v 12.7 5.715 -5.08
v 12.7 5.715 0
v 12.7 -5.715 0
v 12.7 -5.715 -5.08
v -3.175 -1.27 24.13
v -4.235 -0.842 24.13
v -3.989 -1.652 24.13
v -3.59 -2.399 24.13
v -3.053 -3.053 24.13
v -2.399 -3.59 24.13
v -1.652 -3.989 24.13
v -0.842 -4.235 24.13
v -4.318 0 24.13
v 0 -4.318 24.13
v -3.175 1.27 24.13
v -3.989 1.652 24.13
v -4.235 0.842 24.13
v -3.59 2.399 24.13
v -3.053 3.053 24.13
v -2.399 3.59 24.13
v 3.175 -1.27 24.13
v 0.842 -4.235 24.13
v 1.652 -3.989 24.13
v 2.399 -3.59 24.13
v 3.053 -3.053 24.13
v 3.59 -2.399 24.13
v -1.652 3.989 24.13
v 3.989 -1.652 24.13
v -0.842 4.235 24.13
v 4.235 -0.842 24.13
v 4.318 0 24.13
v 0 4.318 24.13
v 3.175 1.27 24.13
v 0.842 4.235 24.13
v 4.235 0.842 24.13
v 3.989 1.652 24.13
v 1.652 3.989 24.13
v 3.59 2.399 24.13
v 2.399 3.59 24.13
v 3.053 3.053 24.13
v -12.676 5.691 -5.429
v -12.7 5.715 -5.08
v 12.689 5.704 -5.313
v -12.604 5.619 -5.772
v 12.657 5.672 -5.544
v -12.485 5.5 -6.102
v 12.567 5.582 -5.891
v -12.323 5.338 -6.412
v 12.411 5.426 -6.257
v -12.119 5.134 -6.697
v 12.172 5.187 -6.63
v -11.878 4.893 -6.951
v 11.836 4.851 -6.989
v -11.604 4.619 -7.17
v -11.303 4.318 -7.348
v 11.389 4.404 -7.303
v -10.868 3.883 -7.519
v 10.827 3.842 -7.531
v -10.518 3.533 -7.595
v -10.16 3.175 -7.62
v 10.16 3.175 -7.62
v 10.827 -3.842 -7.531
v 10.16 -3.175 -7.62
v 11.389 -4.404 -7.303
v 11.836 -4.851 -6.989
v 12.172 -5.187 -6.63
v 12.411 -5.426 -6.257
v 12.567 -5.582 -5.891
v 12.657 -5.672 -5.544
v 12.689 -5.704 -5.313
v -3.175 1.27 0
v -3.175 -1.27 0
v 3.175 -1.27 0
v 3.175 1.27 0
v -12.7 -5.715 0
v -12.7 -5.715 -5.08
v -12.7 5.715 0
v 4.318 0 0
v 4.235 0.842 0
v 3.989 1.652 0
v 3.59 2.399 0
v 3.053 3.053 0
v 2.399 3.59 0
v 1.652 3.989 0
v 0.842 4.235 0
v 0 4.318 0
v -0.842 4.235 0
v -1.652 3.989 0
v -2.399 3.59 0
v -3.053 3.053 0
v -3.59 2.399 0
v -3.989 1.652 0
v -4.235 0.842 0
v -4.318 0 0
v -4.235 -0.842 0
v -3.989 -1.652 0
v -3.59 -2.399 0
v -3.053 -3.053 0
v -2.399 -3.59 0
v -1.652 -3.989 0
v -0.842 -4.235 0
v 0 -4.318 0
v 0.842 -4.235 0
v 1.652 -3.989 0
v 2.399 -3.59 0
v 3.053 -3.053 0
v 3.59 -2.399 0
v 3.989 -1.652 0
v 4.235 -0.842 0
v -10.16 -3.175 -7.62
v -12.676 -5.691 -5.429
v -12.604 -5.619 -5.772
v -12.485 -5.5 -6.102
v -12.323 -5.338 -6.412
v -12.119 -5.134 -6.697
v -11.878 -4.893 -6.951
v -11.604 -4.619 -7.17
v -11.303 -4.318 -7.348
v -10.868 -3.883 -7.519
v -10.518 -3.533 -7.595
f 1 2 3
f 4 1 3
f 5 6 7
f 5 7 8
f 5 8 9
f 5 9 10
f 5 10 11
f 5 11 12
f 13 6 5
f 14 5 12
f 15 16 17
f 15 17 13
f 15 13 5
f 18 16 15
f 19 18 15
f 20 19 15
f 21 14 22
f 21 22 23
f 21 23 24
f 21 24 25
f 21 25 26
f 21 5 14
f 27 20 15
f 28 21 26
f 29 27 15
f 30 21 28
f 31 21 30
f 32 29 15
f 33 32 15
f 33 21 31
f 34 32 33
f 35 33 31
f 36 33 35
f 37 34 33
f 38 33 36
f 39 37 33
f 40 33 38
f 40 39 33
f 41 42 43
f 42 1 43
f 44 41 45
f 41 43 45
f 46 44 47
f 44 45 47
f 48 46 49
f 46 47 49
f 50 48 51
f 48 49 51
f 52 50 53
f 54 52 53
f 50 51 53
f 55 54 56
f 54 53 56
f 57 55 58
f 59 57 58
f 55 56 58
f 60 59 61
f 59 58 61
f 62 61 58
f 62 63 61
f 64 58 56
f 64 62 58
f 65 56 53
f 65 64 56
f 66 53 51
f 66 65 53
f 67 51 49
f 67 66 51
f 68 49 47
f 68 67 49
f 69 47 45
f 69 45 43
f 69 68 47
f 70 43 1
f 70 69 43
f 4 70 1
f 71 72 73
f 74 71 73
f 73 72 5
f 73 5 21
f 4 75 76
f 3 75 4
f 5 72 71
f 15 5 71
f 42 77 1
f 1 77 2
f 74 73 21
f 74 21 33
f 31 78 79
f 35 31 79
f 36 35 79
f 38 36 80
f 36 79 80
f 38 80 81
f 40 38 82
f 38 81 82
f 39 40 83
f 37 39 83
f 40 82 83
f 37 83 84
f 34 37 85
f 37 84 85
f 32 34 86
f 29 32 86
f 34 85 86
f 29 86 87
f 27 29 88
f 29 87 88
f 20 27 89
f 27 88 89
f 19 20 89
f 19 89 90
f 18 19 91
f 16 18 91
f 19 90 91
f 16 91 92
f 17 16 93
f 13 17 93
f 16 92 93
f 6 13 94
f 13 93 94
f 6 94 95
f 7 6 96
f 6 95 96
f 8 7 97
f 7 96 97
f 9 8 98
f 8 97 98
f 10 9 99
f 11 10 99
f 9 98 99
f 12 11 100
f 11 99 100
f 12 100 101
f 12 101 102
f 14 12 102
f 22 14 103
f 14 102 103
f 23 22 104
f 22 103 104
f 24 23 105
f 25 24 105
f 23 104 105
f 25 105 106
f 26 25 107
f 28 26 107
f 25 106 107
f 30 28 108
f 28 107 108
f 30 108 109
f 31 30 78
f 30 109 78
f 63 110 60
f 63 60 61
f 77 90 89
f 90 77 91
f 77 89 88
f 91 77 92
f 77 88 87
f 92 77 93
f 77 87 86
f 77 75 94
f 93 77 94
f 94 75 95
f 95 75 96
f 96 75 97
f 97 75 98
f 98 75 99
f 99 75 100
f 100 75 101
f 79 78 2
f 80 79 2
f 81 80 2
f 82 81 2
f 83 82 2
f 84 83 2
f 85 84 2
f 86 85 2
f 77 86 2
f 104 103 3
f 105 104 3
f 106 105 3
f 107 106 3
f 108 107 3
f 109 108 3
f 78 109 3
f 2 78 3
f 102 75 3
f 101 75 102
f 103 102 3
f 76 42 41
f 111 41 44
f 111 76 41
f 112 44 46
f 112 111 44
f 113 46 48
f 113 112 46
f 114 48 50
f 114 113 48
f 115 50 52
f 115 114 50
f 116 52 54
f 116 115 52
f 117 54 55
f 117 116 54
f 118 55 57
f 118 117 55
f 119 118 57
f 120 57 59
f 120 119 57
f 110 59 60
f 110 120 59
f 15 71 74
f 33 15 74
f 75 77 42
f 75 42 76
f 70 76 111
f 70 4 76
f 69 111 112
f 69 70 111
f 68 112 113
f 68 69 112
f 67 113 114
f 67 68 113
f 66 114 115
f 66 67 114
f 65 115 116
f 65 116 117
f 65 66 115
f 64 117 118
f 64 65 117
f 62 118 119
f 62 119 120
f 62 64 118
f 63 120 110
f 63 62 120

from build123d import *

# Parameters (mm, degrees)
F0_R     = 4.318
F0_W     = 6.35
F0_H     = 2.54
F1_DEPTH = 24.13
F2_W     = 25.4
F2_H     = 11.43
F2_R     = 4.318
F2_W_2   = 6.35
F2_H_2   = 2.54
F3_DEPTH = 7.62
F4_R     = 2.54


with BuildPart() as f1:
    # F0 (on Top) → F1 (new body)
    with BuildSketch(Plane.XY):
        Circle(F0_R)
        Rectangle(F0_W, F0_H, mode=Mode.SUBTRACT)
    extrude(amount=F1_DEPTH)

    # F2 (on face) → F3 (join)
    with BuildSketch(Plane(origin=(0, 0, 0), x_dir=(1, 0, 0), z_dir=(0, 0, -1))):
        Rectangle(F2_W, F2_H)
        Circle(F2_R, mode=Mode.SUBTRACT)
        Circle(F2_R)
        Rectangle(F2_W_2, F2_H_2, mode=Mode.SUBTRACT)
        Rectangle(F2_W_2, F2_H_2)
    extrude(amount=F3_DEPTH)

    # F4
    f4_edges = [f1.edges().sort_by_distance(p)[0] for p in [
        (12.7, 0, -7.62),
        (0, -5.715, -7.62),
        (-12.7, 0, -7.62),
        (0, 5.715, -7.62),
    ]]
    fillet(f4_edges, radius=F4_R)


solid = f1.part
